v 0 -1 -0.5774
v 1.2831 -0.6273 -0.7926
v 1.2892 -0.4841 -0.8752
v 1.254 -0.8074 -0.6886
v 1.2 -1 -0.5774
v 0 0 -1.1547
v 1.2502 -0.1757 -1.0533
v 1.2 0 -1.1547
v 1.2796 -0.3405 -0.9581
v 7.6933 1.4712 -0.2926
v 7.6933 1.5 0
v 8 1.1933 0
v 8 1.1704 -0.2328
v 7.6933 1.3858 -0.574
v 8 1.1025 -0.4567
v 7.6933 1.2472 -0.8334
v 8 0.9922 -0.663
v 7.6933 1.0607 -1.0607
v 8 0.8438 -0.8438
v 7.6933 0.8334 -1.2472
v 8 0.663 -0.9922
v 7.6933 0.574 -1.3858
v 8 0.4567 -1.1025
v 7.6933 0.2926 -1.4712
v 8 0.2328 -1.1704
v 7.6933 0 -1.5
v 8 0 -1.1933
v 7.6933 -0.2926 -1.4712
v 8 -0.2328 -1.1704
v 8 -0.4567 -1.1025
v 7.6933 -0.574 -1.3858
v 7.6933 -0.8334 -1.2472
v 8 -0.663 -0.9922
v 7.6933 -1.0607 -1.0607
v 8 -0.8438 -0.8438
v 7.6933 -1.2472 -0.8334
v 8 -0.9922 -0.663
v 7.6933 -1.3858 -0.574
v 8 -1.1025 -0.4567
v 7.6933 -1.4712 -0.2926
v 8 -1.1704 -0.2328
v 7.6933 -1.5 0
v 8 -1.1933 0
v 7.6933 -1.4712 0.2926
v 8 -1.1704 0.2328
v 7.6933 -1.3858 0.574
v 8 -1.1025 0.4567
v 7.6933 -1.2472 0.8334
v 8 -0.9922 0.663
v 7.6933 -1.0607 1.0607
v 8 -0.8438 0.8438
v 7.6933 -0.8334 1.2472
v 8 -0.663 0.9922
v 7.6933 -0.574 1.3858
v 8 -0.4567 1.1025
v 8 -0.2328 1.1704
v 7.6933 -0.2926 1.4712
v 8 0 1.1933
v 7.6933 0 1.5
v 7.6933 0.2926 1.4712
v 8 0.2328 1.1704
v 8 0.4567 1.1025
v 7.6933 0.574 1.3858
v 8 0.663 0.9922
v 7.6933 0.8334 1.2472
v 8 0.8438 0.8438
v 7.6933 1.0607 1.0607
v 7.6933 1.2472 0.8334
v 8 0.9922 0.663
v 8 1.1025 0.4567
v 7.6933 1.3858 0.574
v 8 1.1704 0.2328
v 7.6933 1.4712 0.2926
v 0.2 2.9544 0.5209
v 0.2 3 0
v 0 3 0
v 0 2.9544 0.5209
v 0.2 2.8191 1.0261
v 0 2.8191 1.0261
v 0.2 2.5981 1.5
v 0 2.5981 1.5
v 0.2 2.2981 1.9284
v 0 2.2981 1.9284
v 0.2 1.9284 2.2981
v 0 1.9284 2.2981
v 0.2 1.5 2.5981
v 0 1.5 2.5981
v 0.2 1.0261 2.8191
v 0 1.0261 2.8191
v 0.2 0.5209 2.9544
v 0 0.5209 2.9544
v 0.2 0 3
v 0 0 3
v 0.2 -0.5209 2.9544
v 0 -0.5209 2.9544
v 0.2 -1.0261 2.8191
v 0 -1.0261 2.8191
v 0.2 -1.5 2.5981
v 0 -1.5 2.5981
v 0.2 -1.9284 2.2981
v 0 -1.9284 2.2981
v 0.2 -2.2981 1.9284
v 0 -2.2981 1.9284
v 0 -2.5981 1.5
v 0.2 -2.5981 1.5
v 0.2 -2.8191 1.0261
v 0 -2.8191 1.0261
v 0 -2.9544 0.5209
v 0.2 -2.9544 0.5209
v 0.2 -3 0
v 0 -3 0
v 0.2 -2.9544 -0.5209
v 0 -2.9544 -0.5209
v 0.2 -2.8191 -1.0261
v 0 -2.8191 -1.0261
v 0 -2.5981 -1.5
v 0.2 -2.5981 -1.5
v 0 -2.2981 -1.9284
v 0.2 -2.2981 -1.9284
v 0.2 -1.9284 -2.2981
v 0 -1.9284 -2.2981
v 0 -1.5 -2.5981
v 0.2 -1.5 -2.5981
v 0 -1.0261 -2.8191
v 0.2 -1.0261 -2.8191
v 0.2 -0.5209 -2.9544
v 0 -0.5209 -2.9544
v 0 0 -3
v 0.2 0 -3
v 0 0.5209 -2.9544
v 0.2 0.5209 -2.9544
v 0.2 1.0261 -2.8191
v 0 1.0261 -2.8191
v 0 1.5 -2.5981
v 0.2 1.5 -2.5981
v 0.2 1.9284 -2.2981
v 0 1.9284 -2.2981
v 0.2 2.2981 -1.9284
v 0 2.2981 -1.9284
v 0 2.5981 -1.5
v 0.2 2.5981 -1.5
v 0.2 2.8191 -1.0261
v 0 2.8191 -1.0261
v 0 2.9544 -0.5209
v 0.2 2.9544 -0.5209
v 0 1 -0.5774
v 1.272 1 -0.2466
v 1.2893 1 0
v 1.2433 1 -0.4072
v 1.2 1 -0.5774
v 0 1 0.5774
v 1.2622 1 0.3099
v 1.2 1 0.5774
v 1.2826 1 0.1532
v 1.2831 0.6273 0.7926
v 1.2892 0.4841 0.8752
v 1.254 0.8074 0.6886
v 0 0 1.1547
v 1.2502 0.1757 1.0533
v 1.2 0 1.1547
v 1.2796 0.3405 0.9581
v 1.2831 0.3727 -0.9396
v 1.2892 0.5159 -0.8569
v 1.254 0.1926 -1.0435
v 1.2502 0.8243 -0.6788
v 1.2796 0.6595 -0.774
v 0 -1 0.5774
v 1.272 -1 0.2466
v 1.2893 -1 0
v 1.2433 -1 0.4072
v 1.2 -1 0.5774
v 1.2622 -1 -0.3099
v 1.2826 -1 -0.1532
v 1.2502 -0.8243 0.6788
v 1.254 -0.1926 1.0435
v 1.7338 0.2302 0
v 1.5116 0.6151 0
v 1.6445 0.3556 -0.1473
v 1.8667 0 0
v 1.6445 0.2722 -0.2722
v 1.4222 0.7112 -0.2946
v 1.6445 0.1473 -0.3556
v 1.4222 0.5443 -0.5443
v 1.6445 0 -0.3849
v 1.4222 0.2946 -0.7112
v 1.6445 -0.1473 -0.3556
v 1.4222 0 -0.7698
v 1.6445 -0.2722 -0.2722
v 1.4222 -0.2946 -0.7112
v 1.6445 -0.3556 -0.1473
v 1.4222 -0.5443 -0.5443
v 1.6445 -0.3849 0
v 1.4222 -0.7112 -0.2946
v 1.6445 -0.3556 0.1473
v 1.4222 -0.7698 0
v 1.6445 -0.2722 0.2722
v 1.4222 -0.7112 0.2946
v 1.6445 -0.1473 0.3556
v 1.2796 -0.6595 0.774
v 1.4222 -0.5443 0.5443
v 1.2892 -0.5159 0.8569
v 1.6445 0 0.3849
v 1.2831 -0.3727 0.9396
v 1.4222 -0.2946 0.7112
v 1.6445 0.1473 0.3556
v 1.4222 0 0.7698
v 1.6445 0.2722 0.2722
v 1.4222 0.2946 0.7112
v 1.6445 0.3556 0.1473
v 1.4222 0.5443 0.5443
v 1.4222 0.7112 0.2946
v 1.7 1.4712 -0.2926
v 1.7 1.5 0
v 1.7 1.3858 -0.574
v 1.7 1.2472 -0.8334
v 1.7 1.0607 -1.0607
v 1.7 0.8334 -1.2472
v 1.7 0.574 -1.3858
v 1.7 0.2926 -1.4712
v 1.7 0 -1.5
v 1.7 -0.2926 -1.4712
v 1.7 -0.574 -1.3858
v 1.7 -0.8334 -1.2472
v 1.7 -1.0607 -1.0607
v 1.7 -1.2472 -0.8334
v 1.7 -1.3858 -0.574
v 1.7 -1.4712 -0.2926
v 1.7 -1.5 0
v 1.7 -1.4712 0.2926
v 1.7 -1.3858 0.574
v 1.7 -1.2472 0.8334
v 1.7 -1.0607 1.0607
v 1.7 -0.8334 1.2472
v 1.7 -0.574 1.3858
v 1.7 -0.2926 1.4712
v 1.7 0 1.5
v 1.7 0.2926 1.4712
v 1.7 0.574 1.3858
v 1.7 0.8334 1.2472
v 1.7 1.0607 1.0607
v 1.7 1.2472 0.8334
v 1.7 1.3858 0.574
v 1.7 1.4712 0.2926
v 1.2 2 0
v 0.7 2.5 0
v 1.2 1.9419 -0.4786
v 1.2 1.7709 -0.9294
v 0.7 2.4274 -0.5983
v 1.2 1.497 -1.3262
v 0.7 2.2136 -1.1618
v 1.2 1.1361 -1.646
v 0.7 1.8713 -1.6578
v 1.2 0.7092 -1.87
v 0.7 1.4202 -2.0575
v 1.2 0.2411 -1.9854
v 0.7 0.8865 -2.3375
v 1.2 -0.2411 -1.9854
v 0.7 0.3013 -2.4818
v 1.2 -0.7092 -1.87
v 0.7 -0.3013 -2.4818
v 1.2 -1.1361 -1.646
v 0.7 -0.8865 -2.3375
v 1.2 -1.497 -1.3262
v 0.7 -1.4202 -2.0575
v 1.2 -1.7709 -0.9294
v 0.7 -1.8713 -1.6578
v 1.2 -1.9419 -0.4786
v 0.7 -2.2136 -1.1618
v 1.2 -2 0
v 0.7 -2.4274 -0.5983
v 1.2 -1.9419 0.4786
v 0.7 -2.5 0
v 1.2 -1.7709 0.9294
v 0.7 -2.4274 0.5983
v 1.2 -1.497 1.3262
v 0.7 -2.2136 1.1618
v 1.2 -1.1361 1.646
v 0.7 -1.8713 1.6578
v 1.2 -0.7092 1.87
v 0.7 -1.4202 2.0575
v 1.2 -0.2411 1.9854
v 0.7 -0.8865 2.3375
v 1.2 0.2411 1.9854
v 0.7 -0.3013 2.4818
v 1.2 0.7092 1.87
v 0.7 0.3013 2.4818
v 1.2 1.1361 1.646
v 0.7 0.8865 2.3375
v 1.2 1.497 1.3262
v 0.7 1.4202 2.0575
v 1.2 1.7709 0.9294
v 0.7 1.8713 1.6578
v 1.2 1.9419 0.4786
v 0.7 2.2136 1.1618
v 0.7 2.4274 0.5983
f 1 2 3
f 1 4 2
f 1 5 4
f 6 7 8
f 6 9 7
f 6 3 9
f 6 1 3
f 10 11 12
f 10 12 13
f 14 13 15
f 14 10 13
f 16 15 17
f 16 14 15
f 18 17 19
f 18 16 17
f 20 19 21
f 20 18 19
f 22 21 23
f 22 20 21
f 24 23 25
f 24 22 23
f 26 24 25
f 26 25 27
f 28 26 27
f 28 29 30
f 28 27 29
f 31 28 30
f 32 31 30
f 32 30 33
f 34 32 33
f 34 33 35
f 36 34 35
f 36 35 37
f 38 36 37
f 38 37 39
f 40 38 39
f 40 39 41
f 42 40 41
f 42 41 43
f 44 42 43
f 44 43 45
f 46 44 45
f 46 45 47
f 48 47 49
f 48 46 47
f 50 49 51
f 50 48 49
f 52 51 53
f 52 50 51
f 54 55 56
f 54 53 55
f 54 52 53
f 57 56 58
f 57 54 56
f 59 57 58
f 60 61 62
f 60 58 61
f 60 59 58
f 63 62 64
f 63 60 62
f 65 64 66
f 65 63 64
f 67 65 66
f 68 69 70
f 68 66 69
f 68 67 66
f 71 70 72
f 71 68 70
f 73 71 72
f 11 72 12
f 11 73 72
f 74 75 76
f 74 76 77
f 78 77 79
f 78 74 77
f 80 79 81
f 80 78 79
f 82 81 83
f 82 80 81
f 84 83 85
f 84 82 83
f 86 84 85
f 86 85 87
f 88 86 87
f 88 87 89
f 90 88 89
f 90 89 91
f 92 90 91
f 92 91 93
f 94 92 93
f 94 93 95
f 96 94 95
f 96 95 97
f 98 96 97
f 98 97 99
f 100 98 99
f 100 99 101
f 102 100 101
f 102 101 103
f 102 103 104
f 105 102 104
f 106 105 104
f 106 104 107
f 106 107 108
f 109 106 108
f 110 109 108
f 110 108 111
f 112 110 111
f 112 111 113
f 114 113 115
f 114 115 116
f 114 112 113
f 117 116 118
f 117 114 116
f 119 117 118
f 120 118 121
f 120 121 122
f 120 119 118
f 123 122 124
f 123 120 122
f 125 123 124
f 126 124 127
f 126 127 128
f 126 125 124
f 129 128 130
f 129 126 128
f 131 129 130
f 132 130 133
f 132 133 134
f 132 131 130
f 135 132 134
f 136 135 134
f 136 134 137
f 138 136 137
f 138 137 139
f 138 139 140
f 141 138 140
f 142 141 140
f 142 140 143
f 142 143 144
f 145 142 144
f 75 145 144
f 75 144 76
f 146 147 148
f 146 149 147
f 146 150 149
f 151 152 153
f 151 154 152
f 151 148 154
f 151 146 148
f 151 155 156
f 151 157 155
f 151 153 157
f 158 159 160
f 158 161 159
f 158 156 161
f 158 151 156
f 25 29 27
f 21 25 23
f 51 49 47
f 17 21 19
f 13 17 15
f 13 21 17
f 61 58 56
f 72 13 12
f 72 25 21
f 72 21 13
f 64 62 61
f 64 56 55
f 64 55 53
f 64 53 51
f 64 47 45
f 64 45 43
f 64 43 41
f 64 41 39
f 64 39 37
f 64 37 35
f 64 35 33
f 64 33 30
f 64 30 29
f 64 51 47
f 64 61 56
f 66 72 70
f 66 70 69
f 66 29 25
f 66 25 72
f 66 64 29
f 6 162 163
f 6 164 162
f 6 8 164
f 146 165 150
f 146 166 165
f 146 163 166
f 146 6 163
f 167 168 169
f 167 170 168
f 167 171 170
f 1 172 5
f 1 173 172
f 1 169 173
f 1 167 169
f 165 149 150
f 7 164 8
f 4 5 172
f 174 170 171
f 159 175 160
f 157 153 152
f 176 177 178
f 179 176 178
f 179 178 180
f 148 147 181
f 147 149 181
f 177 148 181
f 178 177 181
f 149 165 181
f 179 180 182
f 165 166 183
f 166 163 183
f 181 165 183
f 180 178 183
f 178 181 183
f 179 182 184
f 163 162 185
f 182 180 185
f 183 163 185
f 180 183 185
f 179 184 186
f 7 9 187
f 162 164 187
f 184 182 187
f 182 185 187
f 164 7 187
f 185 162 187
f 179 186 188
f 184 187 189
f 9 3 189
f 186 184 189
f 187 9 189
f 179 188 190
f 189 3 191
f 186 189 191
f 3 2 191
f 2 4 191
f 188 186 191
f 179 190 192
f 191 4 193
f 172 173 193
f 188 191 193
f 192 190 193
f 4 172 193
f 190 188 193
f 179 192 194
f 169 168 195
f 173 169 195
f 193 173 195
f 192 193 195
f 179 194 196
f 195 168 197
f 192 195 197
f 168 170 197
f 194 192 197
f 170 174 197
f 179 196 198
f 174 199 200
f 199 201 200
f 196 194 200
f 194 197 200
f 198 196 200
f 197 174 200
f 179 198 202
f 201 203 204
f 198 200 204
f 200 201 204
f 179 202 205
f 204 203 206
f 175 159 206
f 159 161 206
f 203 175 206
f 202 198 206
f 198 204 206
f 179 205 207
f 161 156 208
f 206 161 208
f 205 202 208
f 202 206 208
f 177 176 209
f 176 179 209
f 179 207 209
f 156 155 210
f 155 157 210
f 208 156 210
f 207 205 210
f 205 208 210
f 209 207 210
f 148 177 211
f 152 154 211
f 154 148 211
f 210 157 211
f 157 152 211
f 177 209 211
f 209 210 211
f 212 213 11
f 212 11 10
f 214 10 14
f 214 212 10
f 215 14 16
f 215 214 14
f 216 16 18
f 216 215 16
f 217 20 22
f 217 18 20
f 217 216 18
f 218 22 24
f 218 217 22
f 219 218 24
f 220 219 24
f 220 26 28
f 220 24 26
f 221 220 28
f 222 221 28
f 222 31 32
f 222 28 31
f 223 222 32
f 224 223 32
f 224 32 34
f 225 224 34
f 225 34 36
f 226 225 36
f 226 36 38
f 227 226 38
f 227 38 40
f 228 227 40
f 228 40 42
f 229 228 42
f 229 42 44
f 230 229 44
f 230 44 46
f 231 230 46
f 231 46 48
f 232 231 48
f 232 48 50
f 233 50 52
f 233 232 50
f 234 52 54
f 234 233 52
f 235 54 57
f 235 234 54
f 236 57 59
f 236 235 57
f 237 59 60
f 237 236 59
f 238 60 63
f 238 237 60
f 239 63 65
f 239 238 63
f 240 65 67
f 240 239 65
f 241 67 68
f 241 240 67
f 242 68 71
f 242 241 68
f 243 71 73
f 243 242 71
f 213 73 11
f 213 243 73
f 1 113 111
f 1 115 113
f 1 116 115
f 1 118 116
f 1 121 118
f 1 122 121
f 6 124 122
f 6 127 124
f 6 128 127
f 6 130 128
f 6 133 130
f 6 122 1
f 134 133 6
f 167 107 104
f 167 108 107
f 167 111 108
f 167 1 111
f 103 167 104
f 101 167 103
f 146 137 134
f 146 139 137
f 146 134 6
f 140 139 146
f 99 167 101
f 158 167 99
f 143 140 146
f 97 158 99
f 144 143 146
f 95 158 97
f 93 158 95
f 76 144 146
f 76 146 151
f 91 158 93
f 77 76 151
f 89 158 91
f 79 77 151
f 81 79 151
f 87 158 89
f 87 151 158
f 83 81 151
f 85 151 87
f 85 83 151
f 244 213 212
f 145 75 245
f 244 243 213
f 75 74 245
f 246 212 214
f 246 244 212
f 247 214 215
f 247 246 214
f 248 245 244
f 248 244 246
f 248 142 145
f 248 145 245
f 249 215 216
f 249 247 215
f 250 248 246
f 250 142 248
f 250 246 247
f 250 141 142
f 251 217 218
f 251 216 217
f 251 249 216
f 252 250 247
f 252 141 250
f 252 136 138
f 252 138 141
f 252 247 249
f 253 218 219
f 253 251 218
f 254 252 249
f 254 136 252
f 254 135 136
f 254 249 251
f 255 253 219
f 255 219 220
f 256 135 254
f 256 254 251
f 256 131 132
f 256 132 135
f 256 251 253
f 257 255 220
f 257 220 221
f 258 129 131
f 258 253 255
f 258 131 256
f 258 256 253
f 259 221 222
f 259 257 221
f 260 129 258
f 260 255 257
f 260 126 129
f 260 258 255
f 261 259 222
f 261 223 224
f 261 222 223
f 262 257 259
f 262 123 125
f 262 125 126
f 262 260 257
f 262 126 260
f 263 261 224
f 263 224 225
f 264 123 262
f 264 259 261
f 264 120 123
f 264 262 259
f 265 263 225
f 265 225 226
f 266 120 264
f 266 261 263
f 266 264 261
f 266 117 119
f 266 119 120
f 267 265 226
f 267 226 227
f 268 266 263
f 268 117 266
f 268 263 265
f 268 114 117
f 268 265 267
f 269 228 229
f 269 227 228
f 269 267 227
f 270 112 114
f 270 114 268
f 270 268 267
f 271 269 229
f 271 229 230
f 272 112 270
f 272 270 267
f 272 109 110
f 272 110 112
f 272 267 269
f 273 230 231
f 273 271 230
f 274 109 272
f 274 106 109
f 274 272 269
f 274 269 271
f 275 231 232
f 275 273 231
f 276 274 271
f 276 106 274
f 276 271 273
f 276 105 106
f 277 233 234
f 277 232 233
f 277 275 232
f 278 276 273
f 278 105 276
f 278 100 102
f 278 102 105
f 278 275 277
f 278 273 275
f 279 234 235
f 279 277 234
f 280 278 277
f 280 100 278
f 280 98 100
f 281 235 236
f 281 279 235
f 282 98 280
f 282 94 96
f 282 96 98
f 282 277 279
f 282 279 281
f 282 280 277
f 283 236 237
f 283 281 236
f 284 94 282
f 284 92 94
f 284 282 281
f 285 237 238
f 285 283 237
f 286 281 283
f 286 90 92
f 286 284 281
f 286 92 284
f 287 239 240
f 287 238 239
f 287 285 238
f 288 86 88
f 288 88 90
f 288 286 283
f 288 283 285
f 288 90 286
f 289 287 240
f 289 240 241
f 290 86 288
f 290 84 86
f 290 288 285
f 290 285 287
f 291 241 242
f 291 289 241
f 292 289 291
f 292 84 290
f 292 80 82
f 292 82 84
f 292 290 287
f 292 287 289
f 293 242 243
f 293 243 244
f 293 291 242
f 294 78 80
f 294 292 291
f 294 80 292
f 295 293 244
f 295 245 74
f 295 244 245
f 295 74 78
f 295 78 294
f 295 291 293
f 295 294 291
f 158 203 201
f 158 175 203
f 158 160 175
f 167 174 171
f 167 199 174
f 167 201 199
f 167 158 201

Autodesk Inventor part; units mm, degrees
ref_plane "YZ Plane" through (0, 0, 0) normal (1, 0, 0) x (0, 1, 0)
ref_plane "XZ Plane" through (0, 0, 0) normal (0, 1, 0) x (-1, 0, 0)
ref_plane "XY Plane" through (0, 0, 0) normal (0, 0, 1) x (1, 0, 0)
sketch "Skizze1" plane through (0, 0, 0) normal (0, 0, 1) x (1, 0, 0)
  line L0 (8, 0) -> (8, 1.5)
  line L1 (8, 1.5) -> (3.2, 1.5)
  line L2 (3.2, 1.5) -> (2.8933, 1.5)
  line L3 (0, 3) -> (0, 1.1547)
  line L4 (0, 1.1547) -> (1.2, 1.1547)
  line L5 (1.2, 1.1547) -> (1.8667, 0)
  line L6 (1.8667, 0) -> (8, 0)
  line L7 (0, 3) -> (0.2, 3)
  line L8 (0.2, 3) -> (1.7, 1.5)
  line L9 (2.8933, 1.5) -> (1.7, 1.5)
  line L10 (3.2, 1.5) -> (1.7, 1.5) construction
  line L11 (1.7, 1.5) -> (1.7, 1.5)
  line L12 (-12.7, 0) -> (165.1, 0) projected
  line L13 (0, -1.0566) -> (0, 13.7363) projected
  dimension "d0" = 8
  dimension "d1" = 4.8
  dimension "d2" = 1.2
  dimension "d3" = 3
  dimension "d6" = 1.7
  dimension "d7" = 45
  dimension "d8" = 2.3094
  dimension "d9" = 60
  dimension "d10" = 6
  dimension "d11" = 3
  dimension "d12" = 0.3067
revolve "Körper" add sketch "Skizze1" angle 360 about axis through (1.8667, 0, 0) along (1, 0, 0) contours L6 L5 L4 L3 L7 L8 L9 L2 L1 L0
sketch "Skizze2" plane through (0, 0, 0) normal (-1, 0, 0) x (0, 0, 1)
  circle A0 centre (0, 0) radius 1.1547 projected
  line L0 (0, -3.6) -> (0, 4.8) projected
  line L1 (-3.6, 0) -> (4.8, 0) projected
  line L2 (1.1547, 0) -> (0.5774, -1)
  line L3 (0.5774, -1) -> (-0.5774, -1)
  line L4 (-0.5774, -1) -> (-1.1547, 0)
  line L5 (-1.1547, 0) -> (-0.5774, 1)
  line L6 (-0.5774, 1) -> (0.5774, 1)
  line L7 (0.5774, 1) -> (1.1547, 0)
  point P0 (0, 1.1547)
extrude "Loch" add sketch "Skizze2" against normal up to next contours L7 A0 | A0 L2 | L6 L0 A0 | A0 L0 L3 | L0 L6 A0 | A0 L3 L0 | L4 A0 | A0 L5
thread "Gewinde" size "M3x0.5" designation "M3" class "6g" standard "ANSI Metrisches M Profil" length 4.8
chamfer "Fase1" distance 0.3067 distance2 0.3067 1 edges at (8, -1.5, 0) measured on face at (8, -0.8298, -0.2045)
equation "\"d0\" = NLG"
equation "\"d1\" = GEL"
equation "\"d2\" = INTI"
equation "\"d3\" = GD"
equation "\"d6\" = KOH"
equation "\"d7\" = 0.5 * SEWI"
equation "\"d8\" = 1.1547 * SW"
equation "\"d10\" = KOD"
equation "\"d11\" = BDM"
equation "\"d12\" = GAL"
equation "\"d15\" = GEL"
equation "\"d17\" = -0.5 * SPD + 0.5 * GD"
equation "\"d18\" = GUL"
equation "\"NLG\" = 8"
equation "\"INTI\" = 1.2"
equation "\"GEL\" = 4.8"
equation "\"GAL\" = 0.61345 * TPU"
equation "\"KOH\" = 1.7"
equation "\"KOD\" = 6"
equation "\"GUL\" = 0.61345 * TPU"
equation "\"SPD\" = NND - 1.2269 * TPU"
equation "\"BDM\" = NND"
equation "\"GD\" = NND"
equation "\"SEWI\" = 90deg"
equation "\"SW\" = 2"
equation "\"NND\" = 3"
equation "\"EPV\" = 3.2"
equation "\"E0\" = 1.155 * SW"
equation "\"THREADDIA\" = 3"
equation "\"TPU\" = 0.5"
equation "\"GD1\" = THREADDIA - 1.2269 * TPU"
equation "\"PTC\" = TPU"
equation "\"TOA\" = 30deg"
properties part number "520 209 112"
